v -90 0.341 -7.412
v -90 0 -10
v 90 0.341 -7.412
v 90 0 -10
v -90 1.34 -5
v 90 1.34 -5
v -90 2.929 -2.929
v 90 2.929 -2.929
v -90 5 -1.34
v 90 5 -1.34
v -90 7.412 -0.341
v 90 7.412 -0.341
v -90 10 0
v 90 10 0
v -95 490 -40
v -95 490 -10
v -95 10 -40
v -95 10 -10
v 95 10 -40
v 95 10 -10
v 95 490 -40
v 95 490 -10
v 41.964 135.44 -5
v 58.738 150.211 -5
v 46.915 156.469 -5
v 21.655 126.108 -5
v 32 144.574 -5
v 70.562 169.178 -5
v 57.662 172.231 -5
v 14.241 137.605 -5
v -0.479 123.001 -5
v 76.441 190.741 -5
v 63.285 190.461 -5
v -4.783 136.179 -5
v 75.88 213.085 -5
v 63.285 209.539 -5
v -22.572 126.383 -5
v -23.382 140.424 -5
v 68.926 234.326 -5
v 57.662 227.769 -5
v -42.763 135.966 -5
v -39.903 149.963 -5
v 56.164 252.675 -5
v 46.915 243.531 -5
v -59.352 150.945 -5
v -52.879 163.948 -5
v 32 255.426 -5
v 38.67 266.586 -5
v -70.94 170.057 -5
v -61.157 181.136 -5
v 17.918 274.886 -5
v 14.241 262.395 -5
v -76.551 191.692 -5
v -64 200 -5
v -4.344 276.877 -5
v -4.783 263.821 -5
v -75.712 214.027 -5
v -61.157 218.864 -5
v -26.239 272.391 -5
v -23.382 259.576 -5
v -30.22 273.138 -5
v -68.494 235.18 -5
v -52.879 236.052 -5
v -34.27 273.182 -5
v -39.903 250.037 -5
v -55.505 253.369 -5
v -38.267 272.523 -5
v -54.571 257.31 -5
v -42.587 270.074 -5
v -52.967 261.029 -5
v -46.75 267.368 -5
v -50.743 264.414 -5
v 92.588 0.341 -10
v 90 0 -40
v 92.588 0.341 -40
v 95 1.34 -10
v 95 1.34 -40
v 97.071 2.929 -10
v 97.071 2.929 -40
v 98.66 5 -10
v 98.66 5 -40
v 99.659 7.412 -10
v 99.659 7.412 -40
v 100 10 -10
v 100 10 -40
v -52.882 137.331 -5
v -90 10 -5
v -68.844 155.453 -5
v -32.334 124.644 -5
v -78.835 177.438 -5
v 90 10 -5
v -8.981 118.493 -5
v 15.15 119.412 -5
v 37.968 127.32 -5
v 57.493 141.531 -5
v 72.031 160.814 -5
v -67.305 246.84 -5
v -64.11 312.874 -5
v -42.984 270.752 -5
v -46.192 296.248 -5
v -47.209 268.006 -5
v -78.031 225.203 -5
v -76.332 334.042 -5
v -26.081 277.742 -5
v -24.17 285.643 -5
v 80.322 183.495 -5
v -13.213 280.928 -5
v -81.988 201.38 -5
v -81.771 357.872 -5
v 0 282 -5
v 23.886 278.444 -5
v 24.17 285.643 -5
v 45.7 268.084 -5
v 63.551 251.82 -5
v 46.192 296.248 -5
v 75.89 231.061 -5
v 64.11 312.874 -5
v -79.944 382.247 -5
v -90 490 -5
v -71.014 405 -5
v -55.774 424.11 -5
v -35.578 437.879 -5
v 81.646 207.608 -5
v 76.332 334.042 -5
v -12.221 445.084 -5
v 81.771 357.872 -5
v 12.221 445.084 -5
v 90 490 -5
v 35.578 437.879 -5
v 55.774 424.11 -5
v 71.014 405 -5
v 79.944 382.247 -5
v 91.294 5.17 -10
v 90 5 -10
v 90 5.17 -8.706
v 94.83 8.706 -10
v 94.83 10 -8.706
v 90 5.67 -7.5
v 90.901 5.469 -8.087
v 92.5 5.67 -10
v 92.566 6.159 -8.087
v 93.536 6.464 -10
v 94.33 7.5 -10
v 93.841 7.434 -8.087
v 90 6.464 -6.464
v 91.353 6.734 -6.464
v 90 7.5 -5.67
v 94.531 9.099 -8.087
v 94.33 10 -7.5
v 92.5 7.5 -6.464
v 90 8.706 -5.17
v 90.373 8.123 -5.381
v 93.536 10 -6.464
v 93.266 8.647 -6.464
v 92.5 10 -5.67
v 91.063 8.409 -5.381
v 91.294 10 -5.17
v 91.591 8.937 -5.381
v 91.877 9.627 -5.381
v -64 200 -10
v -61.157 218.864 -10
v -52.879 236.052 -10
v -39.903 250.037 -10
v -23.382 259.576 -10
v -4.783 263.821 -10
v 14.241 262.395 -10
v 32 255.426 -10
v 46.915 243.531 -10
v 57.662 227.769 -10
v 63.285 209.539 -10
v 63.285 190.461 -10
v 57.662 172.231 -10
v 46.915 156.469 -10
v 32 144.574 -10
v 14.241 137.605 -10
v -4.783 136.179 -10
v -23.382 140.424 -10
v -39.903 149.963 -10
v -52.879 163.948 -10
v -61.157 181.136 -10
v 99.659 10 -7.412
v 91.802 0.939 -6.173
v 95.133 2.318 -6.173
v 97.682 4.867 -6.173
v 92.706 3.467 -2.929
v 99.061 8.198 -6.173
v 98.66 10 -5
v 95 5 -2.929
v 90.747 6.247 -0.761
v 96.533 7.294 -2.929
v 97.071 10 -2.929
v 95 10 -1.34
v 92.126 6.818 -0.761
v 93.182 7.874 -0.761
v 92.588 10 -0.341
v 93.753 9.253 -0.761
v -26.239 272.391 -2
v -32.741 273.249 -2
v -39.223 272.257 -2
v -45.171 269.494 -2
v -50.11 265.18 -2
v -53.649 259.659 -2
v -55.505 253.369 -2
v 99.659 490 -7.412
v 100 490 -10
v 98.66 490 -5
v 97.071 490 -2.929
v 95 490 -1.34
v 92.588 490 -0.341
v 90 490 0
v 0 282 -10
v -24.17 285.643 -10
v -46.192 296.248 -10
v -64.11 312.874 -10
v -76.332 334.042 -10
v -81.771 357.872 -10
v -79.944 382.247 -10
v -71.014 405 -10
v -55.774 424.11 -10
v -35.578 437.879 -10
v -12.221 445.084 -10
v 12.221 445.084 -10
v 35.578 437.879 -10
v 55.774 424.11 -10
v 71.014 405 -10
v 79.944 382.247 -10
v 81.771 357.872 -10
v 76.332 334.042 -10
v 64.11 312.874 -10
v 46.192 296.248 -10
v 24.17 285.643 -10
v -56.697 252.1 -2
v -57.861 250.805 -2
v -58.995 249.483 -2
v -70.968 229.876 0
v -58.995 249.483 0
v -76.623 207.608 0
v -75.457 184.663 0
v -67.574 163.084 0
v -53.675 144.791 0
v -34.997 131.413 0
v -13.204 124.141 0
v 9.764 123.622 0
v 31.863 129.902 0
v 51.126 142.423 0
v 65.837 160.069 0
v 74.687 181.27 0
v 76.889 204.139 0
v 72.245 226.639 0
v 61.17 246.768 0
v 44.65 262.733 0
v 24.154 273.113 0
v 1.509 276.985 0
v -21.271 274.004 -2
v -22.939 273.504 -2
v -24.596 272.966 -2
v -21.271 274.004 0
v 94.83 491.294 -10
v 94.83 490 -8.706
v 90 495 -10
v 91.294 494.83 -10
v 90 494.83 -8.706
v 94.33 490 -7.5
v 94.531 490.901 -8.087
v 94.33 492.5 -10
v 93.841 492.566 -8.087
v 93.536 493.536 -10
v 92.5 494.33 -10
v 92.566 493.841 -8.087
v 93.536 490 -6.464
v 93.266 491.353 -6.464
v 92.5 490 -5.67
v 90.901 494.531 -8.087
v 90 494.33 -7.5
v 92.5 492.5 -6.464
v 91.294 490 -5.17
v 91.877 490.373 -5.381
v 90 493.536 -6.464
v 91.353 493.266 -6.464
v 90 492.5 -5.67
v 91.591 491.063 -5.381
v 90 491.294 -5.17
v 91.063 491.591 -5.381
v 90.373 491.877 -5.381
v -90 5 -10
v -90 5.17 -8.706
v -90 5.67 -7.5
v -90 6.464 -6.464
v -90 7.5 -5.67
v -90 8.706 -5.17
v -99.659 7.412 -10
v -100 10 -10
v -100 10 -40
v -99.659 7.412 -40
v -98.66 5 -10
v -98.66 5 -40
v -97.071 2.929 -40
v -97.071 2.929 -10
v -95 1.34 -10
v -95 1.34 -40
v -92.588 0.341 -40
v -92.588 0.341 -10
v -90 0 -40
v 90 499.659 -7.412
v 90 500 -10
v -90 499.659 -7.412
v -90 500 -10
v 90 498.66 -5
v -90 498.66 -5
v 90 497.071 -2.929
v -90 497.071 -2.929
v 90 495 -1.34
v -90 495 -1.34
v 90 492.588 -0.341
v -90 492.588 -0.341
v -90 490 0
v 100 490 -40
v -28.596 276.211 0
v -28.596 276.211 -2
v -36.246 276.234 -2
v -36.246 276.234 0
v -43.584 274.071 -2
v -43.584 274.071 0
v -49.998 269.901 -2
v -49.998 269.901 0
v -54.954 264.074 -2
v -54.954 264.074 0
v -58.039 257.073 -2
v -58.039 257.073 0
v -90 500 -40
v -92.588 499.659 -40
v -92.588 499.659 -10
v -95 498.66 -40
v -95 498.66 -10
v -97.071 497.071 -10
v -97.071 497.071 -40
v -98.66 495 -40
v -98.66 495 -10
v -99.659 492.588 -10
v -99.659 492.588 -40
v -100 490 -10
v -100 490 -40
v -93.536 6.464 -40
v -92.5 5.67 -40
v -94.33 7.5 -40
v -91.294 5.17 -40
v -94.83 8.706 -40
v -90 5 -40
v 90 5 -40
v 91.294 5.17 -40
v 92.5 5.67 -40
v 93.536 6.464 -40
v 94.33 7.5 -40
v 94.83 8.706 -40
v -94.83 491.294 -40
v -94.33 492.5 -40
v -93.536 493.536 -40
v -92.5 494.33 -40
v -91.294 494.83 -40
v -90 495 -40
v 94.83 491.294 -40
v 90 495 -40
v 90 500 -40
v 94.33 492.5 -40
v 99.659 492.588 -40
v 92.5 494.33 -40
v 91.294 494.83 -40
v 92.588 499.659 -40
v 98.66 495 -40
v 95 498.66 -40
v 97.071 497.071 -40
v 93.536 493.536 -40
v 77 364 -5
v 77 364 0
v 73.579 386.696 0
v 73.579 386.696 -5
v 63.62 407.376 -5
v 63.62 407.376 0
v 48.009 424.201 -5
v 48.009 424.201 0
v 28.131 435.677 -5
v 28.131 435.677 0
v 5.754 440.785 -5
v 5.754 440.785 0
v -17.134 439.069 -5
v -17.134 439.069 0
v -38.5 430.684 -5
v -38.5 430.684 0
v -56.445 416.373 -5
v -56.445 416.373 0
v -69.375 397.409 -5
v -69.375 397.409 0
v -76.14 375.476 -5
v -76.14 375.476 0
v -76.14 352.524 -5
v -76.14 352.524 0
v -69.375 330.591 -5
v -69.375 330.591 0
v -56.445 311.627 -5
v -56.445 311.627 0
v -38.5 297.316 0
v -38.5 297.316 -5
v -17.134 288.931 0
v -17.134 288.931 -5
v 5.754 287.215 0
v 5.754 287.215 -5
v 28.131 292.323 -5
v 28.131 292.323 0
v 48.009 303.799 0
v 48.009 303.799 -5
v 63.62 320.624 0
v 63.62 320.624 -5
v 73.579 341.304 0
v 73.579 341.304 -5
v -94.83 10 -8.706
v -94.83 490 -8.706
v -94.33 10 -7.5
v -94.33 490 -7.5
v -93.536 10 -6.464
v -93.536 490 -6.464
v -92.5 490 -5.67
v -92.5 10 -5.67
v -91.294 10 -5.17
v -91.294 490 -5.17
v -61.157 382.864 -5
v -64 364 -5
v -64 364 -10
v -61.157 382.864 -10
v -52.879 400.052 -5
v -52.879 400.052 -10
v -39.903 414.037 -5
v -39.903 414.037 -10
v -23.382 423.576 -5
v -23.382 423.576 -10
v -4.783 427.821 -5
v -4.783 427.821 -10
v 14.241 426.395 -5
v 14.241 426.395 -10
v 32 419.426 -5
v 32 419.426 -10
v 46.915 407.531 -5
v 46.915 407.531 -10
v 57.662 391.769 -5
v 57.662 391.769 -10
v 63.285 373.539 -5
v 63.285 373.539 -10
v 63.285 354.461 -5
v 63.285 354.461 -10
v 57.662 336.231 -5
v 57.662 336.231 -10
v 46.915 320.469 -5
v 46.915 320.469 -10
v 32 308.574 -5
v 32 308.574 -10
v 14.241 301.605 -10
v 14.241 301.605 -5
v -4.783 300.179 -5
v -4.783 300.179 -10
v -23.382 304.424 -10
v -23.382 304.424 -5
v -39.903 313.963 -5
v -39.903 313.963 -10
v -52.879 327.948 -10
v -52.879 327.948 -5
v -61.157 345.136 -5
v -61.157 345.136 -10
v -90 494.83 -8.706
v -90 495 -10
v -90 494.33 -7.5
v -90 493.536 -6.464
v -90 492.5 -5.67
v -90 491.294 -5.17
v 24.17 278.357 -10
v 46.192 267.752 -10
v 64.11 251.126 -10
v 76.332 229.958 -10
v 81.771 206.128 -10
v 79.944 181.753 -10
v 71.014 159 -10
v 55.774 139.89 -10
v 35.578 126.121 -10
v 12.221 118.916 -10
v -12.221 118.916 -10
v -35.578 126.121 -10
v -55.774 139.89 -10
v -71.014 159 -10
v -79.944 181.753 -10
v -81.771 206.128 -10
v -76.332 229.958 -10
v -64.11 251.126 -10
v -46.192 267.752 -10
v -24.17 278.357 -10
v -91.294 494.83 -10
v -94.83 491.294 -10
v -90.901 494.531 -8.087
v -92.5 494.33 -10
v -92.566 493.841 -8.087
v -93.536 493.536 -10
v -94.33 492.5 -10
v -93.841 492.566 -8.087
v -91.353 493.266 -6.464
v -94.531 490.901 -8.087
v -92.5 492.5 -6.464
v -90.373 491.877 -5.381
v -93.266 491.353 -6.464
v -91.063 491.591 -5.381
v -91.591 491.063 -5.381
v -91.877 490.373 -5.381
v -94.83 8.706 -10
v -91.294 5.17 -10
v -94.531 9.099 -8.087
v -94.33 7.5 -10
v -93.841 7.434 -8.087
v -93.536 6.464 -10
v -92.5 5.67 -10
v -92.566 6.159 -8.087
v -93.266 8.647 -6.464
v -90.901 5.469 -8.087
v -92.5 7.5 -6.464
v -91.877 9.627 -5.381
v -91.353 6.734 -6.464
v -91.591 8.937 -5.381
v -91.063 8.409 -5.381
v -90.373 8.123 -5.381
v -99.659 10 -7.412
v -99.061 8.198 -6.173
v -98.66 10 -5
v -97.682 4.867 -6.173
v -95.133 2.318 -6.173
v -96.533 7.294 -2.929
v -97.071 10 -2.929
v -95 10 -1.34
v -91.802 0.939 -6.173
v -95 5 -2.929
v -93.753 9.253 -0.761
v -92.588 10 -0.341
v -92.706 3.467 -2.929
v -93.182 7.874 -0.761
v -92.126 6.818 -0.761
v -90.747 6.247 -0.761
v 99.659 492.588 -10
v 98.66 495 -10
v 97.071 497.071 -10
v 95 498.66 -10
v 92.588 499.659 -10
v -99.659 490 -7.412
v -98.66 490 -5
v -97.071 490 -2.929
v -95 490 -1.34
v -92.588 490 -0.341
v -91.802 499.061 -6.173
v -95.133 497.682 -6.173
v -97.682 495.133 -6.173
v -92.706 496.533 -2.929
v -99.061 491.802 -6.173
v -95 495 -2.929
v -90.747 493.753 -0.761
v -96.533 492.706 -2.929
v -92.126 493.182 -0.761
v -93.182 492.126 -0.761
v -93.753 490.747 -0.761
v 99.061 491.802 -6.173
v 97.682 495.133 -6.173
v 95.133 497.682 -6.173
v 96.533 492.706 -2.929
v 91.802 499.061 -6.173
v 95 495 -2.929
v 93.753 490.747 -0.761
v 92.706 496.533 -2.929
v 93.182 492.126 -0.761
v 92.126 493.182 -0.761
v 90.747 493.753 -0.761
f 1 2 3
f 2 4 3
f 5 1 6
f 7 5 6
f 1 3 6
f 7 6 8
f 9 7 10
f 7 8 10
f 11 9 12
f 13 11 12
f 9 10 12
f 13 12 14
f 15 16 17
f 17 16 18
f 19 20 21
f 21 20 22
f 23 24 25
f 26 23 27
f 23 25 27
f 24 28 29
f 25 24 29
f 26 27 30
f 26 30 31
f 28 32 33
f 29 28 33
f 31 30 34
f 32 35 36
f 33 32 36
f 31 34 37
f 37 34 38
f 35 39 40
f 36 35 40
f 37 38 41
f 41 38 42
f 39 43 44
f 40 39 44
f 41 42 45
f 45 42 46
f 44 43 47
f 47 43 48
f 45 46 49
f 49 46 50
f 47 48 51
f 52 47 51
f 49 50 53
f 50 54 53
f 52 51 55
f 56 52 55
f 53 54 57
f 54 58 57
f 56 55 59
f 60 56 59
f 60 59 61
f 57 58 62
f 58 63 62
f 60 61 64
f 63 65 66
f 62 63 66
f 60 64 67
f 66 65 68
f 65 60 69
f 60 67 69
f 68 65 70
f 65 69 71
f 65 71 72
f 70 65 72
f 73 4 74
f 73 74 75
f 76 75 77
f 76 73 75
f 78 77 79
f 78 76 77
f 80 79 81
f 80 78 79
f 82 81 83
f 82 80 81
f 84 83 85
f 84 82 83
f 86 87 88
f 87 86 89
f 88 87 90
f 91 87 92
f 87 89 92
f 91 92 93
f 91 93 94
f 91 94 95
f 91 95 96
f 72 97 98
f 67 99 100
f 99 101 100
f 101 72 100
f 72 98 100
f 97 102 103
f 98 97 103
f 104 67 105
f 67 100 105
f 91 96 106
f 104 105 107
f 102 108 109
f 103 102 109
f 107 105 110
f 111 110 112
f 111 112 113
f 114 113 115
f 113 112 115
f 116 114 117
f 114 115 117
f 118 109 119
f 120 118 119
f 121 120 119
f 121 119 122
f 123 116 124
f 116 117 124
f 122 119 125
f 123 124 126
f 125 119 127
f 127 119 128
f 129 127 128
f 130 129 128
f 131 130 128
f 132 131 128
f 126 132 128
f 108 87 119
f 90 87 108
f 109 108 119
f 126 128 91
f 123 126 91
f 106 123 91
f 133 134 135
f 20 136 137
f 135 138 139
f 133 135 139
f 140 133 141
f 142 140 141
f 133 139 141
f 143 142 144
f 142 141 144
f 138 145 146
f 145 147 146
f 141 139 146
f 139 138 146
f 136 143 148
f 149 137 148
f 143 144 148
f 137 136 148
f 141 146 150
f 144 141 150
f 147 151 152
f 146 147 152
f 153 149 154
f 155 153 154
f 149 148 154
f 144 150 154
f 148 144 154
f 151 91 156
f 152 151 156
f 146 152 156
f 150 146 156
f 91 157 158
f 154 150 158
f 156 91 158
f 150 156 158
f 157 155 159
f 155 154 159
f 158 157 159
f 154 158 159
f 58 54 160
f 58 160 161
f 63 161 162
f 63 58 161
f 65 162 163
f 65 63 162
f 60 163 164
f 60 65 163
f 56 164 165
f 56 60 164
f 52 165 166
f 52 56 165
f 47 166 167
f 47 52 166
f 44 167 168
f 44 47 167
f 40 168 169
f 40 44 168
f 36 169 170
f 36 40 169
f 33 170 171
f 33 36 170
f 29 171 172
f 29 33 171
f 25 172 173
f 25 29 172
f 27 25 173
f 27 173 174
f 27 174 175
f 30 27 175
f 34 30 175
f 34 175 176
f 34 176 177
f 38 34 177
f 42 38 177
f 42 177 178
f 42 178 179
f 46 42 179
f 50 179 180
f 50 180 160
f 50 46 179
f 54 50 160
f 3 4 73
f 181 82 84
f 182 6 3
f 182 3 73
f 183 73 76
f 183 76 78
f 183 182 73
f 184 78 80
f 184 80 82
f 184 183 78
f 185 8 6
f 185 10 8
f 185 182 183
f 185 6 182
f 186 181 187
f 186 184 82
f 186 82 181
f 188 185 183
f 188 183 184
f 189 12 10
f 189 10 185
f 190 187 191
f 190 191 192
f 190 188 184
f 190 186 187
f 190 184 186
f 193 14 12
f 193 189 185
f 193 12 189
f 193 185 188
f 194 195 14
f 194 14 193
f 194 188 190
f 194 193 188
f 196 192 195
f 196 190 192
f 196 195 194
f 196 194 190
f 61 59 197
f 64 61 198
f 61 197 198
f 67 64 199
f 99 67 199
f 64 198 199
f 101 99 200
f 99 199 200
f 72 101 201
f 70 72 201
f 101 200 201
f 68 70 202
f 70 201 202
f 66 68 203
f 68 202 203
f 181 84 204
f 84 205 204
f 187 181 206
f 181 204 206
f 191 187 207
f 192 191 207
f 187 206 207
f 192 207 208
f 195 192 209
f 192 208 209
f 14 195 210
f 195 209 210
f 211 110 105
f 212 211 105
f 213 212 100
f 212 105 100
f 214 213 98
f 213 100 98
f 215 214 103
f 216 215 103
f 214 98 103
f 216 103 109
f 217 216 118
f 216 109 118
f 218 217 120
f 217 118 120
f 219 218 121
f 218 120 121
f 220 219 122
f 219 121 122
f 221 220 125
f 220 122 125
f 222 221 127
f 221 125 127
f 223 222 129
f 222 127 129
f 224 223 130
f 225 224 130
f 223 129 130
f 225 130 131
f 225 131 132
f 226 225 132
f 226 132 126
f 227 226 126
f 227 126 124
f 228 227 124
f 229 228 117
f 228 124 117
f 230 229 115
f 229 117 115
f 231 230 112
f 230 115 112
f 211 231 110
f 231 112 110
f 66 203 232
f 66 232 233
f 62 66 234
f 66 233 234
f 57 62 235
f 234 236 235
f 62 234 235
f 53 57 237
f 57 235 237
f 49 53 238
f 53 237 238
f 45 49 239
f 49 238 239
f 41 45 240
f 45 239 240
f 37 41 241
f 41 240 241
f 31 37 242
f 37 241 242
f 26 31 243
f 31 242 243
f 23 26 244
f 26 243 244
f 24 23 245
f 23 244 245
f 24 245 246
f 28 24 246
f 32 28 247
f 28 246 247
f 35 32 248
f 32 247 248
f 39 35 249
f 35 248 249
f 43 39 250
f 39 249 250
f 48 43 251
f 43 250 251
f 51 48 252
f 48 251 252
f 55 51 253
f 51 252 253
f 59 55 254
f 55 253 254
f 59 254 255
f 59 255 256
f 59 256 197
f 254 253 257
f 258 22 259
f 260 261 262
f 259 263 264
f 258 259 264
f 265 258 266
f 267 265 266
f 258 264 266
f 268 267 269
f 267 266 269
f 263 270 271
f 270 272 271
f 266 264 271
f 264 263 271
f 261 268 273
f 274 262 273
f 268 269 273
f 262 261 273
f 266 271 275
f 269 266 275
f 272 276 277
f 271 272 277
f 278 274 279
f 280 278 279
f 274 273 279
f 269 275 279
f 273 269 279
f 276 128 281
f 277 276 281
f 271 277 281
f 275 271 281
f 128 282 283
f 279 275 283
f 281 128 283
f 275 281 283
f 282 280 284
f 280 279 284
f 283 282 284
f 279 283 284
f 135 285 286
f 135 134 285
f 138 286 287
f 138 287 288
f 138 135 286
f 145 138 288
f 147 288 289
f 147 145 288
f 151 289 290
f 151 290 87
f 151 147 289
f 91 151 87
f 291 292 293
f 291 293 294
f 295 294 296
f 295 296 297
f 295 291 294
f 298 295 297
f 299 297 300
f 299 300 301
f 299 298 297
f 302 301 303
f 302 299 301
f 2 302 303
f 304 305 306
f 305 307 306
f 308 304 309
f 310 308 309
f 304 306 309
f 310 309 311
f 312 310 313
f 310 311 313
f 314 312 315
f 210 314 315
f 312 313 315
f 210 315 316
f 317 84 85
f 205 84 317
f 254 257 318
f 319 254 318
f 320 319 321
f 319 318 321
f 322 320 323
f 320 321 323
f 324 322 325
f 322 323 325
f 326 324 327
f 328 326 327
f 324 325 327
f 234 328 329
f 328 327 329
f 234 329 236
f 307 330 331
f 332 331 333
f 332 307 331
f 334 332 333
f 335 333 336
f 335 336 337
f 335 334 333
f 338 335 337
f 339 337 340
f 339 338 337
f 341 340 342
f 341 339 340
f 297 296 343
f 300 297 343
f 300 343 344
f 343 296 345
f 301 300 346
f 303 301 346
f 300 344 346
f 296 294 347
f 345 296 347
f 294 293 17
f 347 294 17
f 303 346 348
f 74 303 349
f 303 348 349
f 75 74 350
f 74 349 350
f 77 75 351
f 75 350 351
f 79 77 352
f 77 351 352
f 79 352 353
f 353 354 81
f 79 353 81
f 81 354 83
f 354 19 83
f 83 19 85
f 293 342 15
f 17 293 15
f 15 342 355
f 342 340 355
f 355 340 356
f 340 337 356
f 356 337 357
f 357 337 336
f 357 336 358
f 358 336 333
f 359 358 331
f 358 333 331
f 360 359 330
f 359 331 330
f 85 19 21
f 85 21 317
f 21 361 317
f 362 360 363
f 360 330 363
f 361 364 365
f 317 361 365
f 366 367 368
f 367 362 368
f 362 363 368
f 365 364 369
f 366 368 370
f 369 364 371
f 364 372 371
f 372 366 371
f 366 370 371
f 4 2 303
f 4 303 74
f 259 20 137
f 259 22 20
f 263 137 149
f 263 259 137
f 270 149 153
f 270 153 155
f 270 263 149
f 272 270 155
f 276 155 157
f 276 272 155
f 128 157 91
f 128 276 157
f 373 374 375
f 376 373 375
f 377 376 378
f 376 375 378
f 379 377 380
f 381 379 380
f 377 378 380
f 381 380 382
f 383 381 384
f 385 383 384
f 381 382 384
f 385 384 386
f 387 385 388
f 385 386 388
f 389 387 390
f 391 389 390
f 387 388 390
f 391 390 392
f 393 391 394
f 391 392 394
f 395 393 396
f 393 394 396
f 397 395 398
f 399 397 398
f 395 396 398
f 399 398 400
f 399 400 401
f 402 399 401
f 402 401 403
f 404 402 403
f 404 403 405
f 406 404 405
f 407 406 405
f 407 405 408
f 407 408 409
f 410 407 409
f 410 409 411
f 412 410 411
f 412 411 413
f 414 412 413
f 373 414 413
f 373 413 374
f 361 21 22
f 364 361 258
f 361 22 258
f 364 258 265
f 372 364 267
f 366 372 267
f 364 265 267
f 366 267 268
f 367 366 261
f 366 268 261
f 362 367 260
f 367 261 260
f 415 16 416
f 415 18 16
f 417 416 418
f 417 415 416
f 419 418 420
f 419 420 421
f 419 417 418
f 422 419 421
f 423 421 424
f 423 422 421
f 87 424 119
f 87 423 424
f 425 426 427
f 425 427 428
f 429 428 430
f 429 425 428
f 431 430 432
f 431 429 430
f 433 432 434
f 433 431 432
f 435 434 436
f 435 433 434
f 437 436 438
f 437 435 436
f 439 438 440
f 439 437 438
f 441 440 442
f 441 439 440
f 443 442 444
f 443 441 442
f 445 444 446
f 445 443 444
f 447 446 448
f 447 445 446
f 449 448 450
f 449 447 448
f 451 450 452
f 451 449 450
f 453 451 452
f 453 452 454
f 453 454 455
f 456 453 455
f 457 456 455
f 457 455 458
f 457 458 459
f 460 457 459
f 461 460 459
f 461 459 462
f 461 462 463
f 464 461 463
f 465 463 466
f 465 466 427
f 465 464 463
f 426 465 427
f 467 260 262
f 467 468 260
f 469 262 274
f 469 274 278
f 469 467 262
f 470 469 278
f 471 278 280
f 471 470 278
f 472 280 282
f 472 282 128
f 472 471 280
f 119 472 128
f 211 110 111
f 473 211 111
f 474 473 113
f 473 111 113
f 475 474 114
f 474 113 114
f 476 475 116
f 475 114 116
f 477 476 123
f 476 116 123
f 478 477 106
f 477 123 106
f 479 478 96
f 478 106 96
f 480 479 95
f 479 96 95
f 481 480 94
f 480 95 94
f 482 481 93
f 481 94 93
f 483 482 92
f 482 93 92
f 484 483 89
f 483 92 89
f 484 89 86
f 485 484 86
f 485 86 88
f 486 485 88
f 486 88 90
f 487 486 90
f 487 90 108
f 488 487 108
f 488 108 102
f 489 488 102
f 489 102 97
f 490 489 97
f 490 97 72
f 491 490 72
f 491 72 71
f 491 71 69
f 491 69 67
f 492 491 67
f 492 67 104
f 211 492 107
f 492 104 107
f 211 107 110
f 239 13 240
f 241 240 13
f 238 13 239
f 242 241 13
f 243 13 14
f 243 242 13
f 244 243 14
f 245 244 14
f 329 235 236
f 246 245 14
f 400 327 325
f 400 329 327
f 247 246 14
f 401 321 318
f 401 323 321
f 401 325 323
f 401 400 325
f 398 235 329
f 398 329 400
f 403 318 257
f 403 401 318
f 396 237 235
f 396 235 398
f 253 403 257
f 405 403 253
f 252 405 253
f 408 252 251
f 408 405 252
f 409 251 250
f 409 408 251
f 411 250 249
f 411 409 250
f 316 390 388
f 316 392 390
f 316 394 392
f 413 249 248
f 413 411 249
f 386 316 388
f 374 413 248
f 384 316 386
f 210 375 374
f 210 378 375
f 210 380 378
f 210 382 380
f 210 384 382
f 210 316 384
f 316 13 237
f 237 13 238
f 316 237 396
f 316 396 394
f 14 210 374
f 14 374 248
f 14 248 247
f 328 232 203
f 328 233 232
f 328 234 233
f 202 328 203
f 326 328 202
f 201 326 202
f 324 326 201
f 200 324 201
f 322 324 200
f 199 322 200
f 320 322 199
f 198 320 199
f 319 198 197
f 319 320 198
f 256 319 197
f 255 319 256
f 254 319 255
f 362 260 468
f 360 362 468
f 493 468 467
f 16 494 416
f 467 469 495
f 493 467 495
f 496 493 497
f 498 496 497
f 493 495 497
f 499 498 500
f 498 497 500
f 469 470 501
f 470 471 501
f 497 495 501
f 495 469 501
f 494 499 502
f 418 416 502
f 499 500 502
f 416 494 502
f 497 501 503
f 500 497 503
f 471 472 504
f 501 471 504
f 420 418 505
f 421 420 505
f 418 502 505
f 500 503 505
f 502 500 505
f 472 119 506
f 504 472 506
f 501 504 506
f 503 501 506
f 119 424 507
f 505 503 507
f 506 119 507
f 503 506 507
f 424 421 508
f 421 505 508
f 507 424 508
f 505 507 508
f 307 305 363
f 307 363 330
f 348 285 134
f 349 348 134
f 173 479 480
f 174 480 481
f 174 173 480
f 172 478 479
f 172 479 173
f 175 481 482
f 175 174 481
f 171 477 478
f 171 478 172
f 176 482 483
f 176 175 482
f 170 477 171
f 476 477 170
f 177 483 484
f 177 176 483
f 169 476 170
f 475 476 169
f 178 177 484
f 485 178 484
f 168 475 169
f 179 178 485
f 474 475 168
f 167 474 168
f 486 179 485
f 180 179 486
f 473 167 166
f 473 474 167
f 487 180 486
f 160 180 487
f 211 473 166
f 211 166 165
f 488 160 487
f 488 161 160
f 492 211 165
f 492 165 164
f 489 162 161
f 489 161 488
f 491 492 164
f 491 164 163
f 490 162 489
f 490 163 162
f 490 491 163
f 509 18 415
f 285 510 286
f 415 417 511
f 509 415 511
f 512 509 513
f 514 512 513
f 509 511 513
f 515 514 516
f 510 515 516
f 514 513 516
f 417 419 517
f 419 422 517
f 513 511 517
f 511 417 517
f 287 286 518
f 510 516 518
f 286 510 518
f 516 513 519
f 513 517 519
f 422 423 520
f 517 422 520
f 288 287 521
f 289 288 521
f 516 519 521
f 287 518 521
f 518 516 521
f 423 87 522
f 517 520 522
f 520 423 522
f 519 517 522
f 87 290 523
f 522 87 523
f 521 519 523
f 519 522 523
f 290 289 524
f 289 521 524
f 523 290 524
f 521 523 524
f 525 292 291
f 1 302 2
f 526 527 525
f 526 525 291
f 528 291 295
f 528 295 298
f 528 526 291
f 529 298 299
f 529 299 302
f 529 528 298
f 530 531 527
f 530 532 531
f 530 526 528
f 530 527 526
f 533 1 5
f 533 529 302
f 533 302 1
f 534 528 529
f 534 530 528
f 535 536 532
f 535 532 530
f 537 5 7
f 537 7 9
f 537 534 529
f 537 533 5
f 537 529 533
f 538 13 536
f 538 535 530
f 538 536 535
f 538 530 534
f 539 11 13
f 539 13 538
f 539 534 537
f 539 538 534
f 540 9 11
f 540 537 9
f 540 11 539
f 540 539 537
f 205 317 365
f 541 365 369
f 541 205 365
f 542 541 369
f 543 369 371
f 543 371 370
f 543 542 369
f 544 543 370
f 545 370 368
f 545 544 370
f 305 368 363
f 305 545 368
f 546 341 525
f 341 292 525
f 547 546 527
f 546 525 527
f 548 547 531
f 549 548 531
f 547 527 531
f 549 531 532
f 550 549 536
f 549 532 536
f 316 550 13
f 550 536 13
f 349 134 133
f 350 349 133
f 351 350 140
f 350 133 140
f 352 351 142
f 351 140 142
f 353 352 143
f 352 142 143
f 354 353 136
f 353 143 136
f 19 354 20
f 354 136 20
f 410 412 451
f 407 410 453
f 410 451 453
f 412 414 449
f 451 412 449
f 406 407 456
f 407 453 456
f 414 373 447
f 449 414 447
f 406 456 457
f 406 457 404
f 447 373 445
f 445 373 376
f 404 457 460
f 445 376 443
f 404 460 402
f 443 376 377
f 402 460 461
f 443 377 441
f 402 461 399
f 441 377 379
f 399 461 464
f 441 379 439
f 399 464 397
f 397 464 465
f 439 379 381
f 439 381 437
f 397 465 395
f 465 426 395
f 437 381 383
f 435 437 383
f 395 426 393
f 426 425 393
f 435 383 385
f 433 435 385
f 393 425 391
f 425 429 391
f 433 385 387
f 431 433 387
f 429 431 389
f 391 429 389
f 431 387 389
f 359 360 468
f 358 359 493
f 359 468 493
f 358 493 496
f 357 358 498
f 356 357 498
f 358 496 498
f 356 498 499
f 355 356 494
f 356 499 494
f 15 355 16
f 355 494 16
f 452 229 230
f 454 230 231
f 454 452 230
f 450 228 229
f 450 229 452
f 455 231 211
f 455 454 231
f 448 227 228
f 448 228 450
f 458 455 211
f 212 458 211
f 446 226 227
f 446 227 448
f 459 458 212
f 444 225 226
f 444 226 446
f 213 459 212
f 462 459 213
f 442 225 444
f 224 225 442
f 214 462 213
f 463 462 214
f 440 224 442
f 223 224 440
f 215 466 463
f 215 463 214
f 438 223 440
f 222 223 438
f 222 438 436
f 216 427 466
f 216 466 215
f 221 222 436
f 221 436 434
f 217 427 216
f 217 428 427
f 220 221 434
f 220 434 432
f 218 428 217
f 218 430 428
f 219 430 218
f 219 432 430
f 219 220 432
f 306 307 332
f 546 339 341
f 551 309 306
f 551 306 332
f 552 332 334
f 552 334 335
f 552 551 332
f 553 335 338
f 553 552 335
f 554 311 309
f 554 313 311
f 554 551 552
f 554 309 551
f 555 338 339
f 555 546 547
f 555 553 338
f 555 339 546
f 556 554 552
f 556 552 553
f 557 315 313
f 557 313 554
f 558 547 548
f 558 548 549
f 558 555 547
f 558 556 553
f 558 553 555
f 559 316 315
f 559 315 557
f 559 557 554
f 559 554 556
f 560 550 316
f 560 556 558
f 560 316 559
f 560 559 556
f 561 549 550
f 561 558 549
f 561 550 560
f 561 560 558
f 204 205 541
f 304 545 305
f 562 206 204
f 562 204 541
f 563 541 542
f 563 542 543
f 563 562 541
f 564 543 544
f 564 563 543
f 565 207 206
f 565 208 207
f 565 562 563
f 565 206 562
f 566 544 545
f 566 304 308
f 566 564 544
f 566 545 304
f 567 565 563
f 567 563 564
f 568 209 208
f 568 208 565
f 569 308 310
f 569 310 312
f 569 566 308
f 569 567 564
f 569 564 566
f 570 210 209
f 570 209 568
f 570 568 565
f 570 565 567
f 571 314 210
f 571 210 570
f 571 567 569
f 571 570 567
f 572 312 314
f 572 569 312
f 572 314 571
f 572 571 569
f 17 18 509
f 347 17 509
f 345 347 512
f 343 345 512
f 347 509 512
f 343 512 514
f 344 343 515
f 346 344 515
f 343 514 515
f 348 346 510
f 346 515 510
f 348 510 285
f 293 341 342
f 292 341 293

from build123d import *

# Parameters (mm, degrees)
PAD_DEPTH       = 40
FILLET_R        = 10
THICKNESS_T     = -5
SKETCH043_R     = 64
SKETCH043_R_2   = 23.25
POCKET007_DEPTH = 40.001
SKETCH046_R     = 26.5
POCKET009_DEPTH = 2
SKETCH045_R     = 77
POCKET010_DEPTH = 5.3
SKETCH047_R     = 82
SKETCH047_R_2   = 64
PAD028_DEPTH    = 5


with BuildPart() as part:
    # Sketch → Pad (new body)
    with BuildSketch(Plane.XY):
        with BuildLine():
            Line((-100, 490), (-100, 10))
            ThreePointArc((-100, 10), (-97.0710678119, 2.9289321881), (-90, 0))
            Line((-90, 0), (90, 0))
            ThreePointArc((90, 0), (97.0710678119, 2.9289321881), (100, 10))
            Line((100, 10), (100, 490))
            ThreePointArc((100, 490), (97.0710678119, 497.0710678119), (90, 500))
            Line((90, 500), (-90, 500))
            ThreePointArc((-90, 500), (-97.0710678119, 497.0710678119), (-100, 490))
        make_face()
    extrude(amount=-PAD_DEPTH)

    # Fillet
    fillet_edges = [part.edges().sort_by_distance(p)[0] for p in [
        (-100, 250, 0),
        (-97.071068, 2.928932, 0),
        (0, 0, 0),
        (97.071068, 2.928932, 0),
        (100, 250, 0),
        (97.071068, 497.071068, 0),
        (0, 500, 0),
        (-97.071068, 497.071068, 0),
    ]]
    fillet(fillet_edges, radius=FILLET_R)

    # Thickness
    thickness_openings = [part.faces().sort_by_distance(p)[0] for p in [
        (0, 250, -40),
    ]]
    offset(amount=THICKNESS_T, openings=thickness_openings)

    # Sketch043 → Pocket007 (cut, through all)
    with BuildSketch(Plane.XY):
        with Locations((0, 200)):
            Circle(SKETCH043_R)
        with Locations((-32.5, 250)):
            Circle(SKETCH043_R_2)
        with Locations((0, 364)):
            Circle(SKETCH043_R)
    extrude(amount=-POCKET007_DEPTH, mode=Mode.SUBTRACT)

    # Sketch046 (on Face9 of Pad) → Pocket009 (cut)
    with BuildSketch(Plane.XY):
        with Locations((-32.5, 250)):
            Circle(SKETCH046_R)
    extrude(amount=-POCKET009_DEPTH, mode=Mode.SUBTRACT)

    # Sketch045 (on Face9 of Pad) → Pocket010 (cut)
    with BuildSketch(Plane.XY):
        with Locations((0, 200)):
            Circle(SKETCH045_R)
        with Locations((0, 364)):
            Circle(SKETCH045_R)
    extrude(amount=-POCKET010_DEPTH, mode=Mode.SUBTRACT)

    # Sketch047 (on Face31 of Thickness) → Pad028 (join)
    with BuildSketch(Plane(origin=(0, 0, -5), x_dir=(-1, 0, 0), z_dir=(0, 0, -1))):
        with Locations((0, 200)):
            Circle(SKETCH047_R)
        with Locations((0, 200)):
            Circle(SKETCH047_R_2, mode=Mode.SUBTRACT)
        with Locations((0, 364)):
            Circle(SKETCH047_R)
        with Locations((0, 364)):
            Circle(SKETCH047_R_2, mode=Mode.SUBTRACT)
    extrude(amount=PAD028_DEPTH)


solid = part.part
